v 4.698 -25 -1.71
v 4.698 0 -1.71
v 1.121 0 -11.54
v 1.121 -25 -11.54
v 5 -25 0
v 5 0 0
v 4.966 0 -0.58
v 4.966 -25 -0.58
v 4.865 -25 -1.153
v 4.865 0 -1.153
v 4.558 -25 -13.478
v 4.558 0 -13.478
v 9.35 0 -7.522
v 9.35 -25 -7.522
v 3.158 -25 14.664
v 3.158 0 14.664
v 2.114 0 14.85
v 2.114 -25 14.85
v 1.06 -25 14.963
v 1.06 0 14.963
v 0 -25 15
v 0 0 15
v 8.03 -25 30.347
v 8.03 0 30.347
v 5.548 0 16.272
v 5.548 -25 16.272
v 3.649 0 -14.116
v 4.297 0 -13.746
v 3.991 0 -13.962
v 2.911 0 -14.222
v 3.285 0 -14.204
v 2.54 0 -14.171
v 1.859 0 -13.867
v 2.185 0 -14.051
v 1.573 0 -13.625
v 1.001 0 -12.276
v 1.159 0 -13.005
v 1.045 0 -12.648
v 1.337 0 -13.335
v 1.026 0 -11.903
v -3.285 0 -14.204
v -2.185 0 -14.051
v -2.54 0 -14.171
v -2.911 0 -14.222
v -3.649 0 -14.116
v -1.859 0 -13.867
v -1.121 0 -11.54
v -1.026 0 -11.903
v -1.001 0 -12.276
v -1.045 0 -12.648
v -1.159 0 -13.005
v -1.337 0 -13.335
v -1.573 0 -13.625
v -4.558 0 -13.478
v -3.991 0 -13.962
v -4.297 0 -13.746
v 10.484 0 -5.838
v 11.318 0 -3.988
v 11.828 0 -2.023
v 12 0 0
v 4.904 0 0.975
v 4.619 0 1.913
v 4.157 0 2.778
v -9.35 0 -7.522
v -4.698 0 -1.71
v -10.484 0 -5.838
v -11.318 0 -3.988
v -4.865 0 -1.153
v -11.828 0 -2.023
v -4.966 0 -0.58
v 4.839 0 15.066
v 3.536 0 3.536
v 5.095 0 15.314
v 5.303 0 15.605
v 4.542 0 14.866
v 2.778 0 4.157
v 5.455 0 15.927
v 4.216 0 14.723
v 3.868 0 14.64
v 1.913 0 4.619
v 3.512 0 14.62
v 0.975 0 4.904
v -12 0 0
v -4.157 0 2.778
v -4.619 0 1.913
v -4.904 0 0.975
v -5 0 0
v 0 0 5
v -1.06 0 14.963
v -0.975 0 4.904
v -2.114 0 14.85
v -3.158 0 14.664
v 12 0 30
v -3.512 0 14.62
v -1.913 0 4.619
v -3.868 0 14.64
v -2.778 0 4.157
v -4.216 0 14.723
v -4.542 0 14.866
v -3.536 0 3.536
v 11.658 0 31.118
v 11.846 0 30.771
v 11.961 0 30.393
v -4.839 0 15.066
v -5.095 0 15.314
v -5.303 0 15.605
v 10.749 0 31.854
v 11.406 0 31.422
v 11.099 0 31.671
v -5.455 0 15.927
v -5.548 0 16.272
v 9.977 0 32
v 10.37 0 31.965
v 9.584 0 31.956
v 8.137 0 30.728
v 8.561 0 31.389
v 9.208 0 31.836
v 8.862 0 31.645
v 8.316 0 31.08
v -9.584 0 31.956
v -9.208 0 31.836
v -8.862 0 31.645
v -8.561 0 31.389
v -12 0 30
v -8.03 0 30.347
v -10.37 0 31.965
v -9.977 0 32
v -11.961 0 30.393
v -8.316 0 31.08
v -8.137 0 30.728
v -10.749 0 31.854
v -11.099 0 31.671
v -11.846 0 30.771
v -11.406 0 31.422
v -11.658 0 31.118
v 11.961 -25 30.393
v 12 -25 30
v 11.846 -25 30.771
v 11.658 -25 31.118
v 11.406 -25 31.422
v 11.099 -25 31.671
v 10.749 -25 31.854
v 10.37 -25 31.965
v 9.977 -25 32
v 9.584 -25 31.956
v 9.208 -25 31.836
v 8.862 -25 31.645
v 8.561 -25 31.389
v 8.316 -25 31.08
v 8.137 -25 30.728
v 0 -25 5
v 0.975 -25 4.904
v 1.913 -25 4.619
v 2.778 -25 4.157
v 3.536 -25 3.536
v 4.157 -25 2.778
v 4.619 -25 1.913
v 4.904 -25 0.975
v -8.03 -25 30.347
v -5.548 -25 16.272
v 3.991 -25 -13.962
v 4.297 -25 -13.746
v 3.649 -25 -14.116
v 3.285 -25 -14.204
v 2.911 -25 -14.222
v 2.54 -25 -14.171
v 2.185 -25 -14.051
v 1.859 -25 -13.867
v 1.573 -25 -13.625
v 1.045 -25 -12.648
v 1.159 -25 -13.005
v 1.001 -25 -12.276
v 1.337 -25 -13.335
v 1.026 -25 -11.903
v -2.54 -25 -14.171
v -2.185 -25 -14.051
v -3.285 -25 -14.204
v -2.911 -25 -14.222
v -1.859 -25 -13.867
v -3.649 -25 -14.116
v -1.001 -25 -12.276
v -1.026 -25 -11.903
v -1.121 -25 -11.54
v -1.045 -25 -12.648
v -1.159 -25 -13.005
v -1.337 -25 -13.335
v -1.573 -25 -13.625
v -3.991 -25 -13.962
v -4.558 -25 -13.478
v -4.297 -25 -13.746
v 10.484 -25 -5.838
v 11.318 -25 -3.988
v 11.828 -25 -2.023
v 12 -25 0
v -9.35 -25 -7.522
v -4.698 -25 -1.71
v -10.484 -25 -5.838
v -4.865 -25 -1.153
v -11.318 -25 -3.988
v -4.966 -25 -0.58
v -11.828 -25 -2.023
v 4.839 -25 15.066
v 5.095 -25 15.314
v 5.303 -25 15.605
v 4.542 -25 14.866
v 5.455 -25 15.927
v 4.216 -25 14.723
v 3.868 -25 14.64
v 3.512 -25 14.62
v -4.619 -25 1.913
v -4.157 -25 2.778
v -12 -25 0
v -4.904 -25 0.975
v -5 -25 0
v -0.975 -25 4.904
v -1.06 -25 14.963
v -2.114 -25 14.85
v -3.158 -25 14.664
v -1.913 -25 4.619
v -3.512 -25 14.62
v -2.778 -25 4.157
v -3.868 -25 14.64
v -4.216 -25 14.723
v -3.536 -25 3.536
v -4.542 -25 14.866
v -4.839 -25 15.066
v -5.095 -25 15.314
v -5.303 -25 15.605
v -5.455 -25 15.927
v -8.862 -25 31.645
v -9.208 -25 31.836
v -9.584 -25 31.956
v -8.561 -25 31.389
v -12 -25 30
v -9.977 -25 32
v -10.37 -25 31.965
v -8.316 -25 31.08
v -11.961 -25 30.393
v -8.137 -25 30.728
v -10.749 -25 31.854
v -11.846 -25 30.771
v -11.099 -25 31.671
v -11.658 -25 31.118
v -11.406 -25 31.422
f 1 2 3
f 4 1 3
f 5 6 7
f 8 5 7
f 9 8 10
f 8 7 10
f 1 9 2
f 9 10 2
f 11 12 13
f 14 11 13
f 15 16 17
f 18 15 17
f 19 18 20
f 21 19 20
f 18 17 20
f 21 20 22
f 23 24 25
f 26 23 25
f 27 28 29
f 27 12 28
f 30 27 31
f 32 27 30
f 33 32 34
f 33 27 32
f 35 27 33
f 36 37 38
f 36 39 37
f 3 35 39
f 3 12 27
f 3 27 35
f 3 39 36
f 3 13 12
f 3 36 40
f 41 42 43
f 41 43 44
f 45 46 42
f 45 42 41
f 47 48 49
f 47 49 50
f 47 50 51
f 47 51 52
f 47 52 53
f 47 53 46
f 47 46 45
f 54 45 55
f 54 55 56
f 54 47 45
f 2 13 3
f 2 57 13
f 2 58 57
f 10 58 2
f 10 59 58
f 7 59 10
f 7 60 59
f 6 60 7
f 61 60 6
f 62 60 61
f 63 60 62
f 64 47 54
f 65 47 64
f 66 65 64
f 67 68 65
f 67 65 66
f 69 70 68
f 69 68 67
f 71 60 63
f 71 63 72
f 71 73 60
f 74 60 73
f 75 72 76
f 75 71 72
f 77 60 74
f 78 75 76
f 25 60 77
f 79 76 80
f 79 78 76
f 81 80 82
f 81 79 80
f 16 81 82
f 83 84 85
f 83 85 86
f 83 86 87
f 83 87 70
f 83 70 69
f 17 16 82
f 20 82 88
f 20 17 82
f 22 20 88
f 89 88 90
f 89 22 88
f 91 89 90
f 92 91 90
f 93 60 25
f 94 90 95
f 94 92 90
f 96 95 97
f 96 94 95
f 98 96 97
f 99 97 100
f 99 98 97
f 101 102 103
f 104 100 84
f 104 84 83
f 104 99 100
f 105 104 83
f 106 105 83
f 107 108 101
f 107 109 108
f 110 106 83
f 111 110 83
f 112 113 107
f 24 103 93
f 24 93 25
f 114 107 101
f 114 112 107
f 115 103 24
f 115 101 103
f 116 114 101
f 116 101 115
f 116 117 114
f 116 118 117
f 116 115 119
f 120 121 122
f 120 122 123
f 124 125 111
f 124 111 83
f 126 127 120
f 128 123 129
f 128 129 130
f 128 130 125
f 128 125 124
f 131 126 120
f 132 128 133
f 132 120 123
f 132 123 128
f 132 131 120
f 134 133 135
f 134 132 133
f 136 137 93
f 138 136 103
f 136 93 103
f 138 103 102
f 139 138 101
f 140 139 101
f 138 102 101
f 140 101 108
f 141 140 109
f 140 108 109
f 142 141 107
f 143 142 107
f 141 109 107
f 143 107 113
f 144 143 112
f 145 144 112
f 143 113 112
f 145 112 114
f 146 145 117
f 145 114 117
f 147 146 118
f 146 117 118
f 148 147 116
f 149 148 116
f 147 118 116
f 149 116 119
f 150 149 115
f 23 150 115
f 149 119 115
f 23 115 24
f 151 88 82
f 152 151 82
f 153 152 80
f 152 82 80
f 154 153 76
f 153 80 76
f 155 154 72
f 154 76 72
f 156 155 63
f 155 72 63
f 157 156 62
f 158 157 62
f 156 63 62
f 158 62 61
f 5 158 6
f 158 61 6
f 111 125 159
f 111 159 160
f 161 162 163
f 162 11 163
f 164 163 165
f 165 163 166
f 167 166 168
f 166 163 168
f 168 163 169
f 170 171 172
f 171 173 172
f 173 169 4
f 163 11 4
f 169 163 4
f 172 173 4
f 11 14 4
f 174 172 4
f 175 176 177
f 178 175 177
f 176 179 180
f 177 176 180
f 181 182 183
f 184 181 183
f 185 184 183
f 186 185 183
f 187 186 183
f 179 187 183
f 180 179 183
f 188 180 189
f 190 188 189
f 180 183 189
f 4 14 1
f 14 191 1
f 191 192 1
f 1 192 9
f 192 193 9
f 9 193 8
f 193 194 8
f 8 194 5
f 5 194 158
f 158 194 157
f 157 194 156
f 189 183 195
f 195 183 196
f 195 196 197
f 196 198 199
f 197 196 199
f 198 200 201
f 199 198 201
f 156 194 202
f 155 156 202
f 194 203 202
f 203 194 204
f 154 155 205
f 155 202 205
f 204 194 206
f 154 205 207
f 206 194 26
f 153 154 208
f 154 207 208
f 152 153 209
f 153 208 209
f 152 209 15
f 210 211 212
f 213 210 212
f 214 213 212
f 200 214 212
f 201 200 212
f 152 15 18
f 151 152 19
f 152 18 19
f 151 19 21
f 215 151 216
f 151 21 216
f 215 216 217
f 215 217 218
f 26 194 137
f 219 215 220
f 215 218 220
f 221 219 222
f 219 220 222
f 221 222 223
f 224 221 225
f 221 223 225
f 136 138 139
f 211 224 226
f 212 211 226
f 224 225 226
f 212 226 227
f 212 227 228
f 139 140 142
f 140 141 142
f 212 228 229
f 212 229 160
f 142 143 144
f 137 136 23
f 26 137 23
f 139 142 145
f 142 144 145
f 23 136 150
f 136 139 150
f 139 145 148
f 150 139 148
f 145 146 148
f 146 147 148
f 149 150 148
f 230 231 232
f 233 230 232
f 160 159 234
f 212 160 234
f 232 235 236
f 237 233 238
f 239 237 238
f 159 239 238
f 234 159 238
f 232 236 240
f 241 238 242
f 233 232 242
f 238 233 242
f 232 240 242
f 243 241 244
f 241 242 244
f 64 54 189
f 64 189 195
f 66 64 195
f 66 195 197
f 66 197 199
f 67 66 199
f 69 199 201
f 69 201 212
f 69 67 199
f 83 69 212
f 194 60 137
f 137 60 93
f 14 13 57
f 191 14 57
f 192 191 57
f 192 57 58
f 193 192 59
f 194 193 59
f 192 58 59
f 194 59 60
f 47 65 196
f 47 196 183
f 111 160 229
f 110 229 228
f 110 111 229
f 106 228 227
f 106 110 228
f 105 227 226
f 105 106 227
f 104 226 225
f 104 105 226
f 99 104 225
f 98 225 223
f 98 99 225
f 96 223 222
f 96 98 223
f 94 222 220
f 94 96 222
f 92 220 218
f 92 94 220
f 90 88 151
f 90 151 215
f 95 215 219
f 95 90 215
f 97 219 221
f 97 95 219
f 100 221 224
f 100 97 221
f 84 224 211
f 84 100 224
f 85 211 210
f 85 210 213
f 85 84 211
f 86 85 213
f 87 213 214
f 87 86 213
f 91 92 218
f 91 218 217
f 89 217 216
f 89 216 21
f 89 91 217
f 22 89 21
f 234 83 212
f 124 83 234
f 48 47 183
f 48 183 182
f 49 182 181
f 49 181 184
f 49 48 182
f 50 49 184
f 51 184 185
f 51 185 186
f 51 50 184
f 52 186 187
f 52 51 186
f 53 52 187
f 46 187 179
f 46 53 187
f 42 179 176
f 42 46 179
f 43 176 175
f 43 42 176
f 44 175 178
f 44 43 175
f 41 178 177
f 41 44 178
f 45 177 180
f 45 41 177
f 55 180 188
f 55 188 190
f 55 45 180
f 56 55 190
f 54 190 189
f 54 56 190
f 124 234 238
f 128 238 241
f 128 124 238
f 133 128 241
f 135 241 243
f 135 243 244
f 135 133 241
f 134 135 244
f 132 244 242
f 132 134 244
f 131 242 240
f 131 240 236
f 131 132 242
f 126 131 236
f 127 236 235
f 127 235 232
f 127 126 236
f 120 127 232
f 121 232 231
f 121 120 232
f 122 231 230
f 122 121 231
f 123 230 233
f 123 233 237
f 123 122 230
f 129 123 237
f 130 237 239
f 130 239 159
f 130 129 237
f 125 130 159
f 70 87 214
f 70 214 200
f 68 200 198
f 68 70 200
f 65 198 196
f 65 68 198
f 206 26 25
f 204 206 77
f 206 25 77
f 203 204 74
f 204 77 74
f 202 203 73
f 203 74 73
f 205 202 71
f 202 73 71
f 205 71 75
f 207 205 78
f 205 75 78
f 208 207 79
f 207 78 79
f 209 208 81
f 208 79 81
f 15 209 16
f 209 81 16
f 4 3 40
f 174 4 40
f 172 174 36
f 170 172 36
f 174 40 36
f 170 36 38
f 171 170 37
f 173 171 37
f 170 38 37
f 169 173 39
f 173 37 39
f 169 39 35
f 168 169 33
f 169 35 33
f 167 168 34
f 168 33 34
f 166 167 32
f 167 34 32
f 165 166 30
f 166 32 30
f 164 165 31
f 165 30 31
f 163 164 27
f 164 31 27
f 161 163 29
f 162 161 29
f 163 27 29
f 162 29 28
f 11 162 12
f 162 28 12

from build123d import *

# Parameters (mm, degrees)
F1_DEPTH = 25


with BuildPart() as f1:
    # F0 (on Front) → F1 (new body)
    with BuildSketch(Plane.XZ):
        with BuildLine():
            ThreePointArc((0, 5), (3.535534, 3.535534), (5, 0))
            ThreePointArc((5, 0), (4.924039, -0.868241), (4.698463, -1.710101))
            Line((4.698463, -1.710101), (1.120615, -11.540158))
            ThreePointArc((1.120615, -11.540158), (2.017935, -13.966481), (4.558306, -13.477866))
            Line((4.558306, -13.477866), (9.349836, -7.522006))
            ThreePointArc((9.349836, -7.522006), (11.318084, -3.987604), (12, 0))
            Line((12, 0), (12, 30))
            ThreePointArc((12, 30), (10.174311, 31.992389), (8.030384, 30.347296))
            Line((8.030384, 30.347296), (5.548481, 16.271721))
            ThreePointArc((5.548481, 16.271721), (4.695037, 14.959451), (3.157822, 14.663838))
            ThreePointArc((3.157822, 14.663838), (1.587832, 14.915723), (0, 15))
            Line((0, 15), (0, 5))
        make_face()
    extrude(amount=F1_DEPTH)

    # F2: F1 across face


with BuildPart() as f1_1:
    add(f1.part)
    add(f1.part.mirror(Plane(origin=(0, -12.5, 10), x_dir=(0, -1, 0), z_dir=(-1, 0, 0))))


solid = f1_1.part
